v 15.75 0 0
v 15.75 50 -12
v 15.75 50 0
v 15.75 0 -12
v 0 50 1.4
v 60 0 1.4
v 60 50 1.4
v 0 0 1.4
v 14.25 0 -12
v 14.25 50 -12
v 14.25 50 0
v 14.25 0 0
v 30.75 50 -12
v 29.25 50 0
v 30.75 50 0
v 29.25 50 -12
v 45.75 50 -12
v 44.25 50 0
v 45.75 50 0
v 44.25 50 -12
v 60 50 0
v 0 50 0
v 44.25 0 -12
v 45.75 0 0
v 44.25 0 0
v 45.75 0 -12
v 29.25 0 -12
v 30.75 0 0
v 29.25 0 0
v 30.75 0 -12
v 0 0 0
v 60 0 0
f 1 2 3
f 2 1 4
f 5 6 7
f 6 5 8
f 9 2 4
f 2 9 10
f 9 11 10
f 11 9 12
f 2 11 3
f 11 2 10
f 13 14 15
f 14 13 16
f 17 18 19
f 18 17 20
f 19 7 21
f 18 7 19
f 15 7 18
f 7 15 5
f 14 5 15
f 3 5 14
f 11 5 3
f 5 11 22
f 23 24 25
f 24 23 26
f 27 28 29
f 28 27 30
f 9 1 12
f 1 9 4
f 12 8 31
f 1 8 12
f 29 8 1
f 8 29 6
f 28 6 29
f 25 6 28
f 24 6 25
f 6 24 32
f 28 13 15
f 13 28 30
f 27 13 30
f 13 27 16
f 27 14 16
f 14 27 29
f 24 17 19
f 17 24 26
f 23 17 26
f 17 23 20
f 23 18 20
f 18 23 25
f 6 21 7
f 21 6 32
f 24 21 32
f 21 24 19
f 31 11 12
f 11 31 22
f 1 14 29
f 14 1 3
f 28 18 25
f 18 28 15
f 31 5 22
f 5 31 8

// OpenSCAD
$fn = 32;

// ----------------------------------------------------------------------
// Ribbed panel: 1.4 mm panel
// ----------------------------------------------------------------------

// --- parameters (mm) ---
panel_l = 60;             // panel length, X
panel_w = 50;             // panel width, Y
panel_t = 1.4;            // panel thickness, Z
rib_t = 1.5;              // rib thickness
rib_h = 12;               // rib height below the panel
ribs = 3;                 // number of ribs

total_h = panel_t + rib_h;  // overall height

union() {
  cube([panel_l, panel_w, panel_t]);
  for (i = [1 : ribs])
    translate([i * panel_l / (ribs + 1) - rib_t / 2, 0, -rib_h])
      cube([rib_t, panel_w, rib_h + panel_t]);
}
